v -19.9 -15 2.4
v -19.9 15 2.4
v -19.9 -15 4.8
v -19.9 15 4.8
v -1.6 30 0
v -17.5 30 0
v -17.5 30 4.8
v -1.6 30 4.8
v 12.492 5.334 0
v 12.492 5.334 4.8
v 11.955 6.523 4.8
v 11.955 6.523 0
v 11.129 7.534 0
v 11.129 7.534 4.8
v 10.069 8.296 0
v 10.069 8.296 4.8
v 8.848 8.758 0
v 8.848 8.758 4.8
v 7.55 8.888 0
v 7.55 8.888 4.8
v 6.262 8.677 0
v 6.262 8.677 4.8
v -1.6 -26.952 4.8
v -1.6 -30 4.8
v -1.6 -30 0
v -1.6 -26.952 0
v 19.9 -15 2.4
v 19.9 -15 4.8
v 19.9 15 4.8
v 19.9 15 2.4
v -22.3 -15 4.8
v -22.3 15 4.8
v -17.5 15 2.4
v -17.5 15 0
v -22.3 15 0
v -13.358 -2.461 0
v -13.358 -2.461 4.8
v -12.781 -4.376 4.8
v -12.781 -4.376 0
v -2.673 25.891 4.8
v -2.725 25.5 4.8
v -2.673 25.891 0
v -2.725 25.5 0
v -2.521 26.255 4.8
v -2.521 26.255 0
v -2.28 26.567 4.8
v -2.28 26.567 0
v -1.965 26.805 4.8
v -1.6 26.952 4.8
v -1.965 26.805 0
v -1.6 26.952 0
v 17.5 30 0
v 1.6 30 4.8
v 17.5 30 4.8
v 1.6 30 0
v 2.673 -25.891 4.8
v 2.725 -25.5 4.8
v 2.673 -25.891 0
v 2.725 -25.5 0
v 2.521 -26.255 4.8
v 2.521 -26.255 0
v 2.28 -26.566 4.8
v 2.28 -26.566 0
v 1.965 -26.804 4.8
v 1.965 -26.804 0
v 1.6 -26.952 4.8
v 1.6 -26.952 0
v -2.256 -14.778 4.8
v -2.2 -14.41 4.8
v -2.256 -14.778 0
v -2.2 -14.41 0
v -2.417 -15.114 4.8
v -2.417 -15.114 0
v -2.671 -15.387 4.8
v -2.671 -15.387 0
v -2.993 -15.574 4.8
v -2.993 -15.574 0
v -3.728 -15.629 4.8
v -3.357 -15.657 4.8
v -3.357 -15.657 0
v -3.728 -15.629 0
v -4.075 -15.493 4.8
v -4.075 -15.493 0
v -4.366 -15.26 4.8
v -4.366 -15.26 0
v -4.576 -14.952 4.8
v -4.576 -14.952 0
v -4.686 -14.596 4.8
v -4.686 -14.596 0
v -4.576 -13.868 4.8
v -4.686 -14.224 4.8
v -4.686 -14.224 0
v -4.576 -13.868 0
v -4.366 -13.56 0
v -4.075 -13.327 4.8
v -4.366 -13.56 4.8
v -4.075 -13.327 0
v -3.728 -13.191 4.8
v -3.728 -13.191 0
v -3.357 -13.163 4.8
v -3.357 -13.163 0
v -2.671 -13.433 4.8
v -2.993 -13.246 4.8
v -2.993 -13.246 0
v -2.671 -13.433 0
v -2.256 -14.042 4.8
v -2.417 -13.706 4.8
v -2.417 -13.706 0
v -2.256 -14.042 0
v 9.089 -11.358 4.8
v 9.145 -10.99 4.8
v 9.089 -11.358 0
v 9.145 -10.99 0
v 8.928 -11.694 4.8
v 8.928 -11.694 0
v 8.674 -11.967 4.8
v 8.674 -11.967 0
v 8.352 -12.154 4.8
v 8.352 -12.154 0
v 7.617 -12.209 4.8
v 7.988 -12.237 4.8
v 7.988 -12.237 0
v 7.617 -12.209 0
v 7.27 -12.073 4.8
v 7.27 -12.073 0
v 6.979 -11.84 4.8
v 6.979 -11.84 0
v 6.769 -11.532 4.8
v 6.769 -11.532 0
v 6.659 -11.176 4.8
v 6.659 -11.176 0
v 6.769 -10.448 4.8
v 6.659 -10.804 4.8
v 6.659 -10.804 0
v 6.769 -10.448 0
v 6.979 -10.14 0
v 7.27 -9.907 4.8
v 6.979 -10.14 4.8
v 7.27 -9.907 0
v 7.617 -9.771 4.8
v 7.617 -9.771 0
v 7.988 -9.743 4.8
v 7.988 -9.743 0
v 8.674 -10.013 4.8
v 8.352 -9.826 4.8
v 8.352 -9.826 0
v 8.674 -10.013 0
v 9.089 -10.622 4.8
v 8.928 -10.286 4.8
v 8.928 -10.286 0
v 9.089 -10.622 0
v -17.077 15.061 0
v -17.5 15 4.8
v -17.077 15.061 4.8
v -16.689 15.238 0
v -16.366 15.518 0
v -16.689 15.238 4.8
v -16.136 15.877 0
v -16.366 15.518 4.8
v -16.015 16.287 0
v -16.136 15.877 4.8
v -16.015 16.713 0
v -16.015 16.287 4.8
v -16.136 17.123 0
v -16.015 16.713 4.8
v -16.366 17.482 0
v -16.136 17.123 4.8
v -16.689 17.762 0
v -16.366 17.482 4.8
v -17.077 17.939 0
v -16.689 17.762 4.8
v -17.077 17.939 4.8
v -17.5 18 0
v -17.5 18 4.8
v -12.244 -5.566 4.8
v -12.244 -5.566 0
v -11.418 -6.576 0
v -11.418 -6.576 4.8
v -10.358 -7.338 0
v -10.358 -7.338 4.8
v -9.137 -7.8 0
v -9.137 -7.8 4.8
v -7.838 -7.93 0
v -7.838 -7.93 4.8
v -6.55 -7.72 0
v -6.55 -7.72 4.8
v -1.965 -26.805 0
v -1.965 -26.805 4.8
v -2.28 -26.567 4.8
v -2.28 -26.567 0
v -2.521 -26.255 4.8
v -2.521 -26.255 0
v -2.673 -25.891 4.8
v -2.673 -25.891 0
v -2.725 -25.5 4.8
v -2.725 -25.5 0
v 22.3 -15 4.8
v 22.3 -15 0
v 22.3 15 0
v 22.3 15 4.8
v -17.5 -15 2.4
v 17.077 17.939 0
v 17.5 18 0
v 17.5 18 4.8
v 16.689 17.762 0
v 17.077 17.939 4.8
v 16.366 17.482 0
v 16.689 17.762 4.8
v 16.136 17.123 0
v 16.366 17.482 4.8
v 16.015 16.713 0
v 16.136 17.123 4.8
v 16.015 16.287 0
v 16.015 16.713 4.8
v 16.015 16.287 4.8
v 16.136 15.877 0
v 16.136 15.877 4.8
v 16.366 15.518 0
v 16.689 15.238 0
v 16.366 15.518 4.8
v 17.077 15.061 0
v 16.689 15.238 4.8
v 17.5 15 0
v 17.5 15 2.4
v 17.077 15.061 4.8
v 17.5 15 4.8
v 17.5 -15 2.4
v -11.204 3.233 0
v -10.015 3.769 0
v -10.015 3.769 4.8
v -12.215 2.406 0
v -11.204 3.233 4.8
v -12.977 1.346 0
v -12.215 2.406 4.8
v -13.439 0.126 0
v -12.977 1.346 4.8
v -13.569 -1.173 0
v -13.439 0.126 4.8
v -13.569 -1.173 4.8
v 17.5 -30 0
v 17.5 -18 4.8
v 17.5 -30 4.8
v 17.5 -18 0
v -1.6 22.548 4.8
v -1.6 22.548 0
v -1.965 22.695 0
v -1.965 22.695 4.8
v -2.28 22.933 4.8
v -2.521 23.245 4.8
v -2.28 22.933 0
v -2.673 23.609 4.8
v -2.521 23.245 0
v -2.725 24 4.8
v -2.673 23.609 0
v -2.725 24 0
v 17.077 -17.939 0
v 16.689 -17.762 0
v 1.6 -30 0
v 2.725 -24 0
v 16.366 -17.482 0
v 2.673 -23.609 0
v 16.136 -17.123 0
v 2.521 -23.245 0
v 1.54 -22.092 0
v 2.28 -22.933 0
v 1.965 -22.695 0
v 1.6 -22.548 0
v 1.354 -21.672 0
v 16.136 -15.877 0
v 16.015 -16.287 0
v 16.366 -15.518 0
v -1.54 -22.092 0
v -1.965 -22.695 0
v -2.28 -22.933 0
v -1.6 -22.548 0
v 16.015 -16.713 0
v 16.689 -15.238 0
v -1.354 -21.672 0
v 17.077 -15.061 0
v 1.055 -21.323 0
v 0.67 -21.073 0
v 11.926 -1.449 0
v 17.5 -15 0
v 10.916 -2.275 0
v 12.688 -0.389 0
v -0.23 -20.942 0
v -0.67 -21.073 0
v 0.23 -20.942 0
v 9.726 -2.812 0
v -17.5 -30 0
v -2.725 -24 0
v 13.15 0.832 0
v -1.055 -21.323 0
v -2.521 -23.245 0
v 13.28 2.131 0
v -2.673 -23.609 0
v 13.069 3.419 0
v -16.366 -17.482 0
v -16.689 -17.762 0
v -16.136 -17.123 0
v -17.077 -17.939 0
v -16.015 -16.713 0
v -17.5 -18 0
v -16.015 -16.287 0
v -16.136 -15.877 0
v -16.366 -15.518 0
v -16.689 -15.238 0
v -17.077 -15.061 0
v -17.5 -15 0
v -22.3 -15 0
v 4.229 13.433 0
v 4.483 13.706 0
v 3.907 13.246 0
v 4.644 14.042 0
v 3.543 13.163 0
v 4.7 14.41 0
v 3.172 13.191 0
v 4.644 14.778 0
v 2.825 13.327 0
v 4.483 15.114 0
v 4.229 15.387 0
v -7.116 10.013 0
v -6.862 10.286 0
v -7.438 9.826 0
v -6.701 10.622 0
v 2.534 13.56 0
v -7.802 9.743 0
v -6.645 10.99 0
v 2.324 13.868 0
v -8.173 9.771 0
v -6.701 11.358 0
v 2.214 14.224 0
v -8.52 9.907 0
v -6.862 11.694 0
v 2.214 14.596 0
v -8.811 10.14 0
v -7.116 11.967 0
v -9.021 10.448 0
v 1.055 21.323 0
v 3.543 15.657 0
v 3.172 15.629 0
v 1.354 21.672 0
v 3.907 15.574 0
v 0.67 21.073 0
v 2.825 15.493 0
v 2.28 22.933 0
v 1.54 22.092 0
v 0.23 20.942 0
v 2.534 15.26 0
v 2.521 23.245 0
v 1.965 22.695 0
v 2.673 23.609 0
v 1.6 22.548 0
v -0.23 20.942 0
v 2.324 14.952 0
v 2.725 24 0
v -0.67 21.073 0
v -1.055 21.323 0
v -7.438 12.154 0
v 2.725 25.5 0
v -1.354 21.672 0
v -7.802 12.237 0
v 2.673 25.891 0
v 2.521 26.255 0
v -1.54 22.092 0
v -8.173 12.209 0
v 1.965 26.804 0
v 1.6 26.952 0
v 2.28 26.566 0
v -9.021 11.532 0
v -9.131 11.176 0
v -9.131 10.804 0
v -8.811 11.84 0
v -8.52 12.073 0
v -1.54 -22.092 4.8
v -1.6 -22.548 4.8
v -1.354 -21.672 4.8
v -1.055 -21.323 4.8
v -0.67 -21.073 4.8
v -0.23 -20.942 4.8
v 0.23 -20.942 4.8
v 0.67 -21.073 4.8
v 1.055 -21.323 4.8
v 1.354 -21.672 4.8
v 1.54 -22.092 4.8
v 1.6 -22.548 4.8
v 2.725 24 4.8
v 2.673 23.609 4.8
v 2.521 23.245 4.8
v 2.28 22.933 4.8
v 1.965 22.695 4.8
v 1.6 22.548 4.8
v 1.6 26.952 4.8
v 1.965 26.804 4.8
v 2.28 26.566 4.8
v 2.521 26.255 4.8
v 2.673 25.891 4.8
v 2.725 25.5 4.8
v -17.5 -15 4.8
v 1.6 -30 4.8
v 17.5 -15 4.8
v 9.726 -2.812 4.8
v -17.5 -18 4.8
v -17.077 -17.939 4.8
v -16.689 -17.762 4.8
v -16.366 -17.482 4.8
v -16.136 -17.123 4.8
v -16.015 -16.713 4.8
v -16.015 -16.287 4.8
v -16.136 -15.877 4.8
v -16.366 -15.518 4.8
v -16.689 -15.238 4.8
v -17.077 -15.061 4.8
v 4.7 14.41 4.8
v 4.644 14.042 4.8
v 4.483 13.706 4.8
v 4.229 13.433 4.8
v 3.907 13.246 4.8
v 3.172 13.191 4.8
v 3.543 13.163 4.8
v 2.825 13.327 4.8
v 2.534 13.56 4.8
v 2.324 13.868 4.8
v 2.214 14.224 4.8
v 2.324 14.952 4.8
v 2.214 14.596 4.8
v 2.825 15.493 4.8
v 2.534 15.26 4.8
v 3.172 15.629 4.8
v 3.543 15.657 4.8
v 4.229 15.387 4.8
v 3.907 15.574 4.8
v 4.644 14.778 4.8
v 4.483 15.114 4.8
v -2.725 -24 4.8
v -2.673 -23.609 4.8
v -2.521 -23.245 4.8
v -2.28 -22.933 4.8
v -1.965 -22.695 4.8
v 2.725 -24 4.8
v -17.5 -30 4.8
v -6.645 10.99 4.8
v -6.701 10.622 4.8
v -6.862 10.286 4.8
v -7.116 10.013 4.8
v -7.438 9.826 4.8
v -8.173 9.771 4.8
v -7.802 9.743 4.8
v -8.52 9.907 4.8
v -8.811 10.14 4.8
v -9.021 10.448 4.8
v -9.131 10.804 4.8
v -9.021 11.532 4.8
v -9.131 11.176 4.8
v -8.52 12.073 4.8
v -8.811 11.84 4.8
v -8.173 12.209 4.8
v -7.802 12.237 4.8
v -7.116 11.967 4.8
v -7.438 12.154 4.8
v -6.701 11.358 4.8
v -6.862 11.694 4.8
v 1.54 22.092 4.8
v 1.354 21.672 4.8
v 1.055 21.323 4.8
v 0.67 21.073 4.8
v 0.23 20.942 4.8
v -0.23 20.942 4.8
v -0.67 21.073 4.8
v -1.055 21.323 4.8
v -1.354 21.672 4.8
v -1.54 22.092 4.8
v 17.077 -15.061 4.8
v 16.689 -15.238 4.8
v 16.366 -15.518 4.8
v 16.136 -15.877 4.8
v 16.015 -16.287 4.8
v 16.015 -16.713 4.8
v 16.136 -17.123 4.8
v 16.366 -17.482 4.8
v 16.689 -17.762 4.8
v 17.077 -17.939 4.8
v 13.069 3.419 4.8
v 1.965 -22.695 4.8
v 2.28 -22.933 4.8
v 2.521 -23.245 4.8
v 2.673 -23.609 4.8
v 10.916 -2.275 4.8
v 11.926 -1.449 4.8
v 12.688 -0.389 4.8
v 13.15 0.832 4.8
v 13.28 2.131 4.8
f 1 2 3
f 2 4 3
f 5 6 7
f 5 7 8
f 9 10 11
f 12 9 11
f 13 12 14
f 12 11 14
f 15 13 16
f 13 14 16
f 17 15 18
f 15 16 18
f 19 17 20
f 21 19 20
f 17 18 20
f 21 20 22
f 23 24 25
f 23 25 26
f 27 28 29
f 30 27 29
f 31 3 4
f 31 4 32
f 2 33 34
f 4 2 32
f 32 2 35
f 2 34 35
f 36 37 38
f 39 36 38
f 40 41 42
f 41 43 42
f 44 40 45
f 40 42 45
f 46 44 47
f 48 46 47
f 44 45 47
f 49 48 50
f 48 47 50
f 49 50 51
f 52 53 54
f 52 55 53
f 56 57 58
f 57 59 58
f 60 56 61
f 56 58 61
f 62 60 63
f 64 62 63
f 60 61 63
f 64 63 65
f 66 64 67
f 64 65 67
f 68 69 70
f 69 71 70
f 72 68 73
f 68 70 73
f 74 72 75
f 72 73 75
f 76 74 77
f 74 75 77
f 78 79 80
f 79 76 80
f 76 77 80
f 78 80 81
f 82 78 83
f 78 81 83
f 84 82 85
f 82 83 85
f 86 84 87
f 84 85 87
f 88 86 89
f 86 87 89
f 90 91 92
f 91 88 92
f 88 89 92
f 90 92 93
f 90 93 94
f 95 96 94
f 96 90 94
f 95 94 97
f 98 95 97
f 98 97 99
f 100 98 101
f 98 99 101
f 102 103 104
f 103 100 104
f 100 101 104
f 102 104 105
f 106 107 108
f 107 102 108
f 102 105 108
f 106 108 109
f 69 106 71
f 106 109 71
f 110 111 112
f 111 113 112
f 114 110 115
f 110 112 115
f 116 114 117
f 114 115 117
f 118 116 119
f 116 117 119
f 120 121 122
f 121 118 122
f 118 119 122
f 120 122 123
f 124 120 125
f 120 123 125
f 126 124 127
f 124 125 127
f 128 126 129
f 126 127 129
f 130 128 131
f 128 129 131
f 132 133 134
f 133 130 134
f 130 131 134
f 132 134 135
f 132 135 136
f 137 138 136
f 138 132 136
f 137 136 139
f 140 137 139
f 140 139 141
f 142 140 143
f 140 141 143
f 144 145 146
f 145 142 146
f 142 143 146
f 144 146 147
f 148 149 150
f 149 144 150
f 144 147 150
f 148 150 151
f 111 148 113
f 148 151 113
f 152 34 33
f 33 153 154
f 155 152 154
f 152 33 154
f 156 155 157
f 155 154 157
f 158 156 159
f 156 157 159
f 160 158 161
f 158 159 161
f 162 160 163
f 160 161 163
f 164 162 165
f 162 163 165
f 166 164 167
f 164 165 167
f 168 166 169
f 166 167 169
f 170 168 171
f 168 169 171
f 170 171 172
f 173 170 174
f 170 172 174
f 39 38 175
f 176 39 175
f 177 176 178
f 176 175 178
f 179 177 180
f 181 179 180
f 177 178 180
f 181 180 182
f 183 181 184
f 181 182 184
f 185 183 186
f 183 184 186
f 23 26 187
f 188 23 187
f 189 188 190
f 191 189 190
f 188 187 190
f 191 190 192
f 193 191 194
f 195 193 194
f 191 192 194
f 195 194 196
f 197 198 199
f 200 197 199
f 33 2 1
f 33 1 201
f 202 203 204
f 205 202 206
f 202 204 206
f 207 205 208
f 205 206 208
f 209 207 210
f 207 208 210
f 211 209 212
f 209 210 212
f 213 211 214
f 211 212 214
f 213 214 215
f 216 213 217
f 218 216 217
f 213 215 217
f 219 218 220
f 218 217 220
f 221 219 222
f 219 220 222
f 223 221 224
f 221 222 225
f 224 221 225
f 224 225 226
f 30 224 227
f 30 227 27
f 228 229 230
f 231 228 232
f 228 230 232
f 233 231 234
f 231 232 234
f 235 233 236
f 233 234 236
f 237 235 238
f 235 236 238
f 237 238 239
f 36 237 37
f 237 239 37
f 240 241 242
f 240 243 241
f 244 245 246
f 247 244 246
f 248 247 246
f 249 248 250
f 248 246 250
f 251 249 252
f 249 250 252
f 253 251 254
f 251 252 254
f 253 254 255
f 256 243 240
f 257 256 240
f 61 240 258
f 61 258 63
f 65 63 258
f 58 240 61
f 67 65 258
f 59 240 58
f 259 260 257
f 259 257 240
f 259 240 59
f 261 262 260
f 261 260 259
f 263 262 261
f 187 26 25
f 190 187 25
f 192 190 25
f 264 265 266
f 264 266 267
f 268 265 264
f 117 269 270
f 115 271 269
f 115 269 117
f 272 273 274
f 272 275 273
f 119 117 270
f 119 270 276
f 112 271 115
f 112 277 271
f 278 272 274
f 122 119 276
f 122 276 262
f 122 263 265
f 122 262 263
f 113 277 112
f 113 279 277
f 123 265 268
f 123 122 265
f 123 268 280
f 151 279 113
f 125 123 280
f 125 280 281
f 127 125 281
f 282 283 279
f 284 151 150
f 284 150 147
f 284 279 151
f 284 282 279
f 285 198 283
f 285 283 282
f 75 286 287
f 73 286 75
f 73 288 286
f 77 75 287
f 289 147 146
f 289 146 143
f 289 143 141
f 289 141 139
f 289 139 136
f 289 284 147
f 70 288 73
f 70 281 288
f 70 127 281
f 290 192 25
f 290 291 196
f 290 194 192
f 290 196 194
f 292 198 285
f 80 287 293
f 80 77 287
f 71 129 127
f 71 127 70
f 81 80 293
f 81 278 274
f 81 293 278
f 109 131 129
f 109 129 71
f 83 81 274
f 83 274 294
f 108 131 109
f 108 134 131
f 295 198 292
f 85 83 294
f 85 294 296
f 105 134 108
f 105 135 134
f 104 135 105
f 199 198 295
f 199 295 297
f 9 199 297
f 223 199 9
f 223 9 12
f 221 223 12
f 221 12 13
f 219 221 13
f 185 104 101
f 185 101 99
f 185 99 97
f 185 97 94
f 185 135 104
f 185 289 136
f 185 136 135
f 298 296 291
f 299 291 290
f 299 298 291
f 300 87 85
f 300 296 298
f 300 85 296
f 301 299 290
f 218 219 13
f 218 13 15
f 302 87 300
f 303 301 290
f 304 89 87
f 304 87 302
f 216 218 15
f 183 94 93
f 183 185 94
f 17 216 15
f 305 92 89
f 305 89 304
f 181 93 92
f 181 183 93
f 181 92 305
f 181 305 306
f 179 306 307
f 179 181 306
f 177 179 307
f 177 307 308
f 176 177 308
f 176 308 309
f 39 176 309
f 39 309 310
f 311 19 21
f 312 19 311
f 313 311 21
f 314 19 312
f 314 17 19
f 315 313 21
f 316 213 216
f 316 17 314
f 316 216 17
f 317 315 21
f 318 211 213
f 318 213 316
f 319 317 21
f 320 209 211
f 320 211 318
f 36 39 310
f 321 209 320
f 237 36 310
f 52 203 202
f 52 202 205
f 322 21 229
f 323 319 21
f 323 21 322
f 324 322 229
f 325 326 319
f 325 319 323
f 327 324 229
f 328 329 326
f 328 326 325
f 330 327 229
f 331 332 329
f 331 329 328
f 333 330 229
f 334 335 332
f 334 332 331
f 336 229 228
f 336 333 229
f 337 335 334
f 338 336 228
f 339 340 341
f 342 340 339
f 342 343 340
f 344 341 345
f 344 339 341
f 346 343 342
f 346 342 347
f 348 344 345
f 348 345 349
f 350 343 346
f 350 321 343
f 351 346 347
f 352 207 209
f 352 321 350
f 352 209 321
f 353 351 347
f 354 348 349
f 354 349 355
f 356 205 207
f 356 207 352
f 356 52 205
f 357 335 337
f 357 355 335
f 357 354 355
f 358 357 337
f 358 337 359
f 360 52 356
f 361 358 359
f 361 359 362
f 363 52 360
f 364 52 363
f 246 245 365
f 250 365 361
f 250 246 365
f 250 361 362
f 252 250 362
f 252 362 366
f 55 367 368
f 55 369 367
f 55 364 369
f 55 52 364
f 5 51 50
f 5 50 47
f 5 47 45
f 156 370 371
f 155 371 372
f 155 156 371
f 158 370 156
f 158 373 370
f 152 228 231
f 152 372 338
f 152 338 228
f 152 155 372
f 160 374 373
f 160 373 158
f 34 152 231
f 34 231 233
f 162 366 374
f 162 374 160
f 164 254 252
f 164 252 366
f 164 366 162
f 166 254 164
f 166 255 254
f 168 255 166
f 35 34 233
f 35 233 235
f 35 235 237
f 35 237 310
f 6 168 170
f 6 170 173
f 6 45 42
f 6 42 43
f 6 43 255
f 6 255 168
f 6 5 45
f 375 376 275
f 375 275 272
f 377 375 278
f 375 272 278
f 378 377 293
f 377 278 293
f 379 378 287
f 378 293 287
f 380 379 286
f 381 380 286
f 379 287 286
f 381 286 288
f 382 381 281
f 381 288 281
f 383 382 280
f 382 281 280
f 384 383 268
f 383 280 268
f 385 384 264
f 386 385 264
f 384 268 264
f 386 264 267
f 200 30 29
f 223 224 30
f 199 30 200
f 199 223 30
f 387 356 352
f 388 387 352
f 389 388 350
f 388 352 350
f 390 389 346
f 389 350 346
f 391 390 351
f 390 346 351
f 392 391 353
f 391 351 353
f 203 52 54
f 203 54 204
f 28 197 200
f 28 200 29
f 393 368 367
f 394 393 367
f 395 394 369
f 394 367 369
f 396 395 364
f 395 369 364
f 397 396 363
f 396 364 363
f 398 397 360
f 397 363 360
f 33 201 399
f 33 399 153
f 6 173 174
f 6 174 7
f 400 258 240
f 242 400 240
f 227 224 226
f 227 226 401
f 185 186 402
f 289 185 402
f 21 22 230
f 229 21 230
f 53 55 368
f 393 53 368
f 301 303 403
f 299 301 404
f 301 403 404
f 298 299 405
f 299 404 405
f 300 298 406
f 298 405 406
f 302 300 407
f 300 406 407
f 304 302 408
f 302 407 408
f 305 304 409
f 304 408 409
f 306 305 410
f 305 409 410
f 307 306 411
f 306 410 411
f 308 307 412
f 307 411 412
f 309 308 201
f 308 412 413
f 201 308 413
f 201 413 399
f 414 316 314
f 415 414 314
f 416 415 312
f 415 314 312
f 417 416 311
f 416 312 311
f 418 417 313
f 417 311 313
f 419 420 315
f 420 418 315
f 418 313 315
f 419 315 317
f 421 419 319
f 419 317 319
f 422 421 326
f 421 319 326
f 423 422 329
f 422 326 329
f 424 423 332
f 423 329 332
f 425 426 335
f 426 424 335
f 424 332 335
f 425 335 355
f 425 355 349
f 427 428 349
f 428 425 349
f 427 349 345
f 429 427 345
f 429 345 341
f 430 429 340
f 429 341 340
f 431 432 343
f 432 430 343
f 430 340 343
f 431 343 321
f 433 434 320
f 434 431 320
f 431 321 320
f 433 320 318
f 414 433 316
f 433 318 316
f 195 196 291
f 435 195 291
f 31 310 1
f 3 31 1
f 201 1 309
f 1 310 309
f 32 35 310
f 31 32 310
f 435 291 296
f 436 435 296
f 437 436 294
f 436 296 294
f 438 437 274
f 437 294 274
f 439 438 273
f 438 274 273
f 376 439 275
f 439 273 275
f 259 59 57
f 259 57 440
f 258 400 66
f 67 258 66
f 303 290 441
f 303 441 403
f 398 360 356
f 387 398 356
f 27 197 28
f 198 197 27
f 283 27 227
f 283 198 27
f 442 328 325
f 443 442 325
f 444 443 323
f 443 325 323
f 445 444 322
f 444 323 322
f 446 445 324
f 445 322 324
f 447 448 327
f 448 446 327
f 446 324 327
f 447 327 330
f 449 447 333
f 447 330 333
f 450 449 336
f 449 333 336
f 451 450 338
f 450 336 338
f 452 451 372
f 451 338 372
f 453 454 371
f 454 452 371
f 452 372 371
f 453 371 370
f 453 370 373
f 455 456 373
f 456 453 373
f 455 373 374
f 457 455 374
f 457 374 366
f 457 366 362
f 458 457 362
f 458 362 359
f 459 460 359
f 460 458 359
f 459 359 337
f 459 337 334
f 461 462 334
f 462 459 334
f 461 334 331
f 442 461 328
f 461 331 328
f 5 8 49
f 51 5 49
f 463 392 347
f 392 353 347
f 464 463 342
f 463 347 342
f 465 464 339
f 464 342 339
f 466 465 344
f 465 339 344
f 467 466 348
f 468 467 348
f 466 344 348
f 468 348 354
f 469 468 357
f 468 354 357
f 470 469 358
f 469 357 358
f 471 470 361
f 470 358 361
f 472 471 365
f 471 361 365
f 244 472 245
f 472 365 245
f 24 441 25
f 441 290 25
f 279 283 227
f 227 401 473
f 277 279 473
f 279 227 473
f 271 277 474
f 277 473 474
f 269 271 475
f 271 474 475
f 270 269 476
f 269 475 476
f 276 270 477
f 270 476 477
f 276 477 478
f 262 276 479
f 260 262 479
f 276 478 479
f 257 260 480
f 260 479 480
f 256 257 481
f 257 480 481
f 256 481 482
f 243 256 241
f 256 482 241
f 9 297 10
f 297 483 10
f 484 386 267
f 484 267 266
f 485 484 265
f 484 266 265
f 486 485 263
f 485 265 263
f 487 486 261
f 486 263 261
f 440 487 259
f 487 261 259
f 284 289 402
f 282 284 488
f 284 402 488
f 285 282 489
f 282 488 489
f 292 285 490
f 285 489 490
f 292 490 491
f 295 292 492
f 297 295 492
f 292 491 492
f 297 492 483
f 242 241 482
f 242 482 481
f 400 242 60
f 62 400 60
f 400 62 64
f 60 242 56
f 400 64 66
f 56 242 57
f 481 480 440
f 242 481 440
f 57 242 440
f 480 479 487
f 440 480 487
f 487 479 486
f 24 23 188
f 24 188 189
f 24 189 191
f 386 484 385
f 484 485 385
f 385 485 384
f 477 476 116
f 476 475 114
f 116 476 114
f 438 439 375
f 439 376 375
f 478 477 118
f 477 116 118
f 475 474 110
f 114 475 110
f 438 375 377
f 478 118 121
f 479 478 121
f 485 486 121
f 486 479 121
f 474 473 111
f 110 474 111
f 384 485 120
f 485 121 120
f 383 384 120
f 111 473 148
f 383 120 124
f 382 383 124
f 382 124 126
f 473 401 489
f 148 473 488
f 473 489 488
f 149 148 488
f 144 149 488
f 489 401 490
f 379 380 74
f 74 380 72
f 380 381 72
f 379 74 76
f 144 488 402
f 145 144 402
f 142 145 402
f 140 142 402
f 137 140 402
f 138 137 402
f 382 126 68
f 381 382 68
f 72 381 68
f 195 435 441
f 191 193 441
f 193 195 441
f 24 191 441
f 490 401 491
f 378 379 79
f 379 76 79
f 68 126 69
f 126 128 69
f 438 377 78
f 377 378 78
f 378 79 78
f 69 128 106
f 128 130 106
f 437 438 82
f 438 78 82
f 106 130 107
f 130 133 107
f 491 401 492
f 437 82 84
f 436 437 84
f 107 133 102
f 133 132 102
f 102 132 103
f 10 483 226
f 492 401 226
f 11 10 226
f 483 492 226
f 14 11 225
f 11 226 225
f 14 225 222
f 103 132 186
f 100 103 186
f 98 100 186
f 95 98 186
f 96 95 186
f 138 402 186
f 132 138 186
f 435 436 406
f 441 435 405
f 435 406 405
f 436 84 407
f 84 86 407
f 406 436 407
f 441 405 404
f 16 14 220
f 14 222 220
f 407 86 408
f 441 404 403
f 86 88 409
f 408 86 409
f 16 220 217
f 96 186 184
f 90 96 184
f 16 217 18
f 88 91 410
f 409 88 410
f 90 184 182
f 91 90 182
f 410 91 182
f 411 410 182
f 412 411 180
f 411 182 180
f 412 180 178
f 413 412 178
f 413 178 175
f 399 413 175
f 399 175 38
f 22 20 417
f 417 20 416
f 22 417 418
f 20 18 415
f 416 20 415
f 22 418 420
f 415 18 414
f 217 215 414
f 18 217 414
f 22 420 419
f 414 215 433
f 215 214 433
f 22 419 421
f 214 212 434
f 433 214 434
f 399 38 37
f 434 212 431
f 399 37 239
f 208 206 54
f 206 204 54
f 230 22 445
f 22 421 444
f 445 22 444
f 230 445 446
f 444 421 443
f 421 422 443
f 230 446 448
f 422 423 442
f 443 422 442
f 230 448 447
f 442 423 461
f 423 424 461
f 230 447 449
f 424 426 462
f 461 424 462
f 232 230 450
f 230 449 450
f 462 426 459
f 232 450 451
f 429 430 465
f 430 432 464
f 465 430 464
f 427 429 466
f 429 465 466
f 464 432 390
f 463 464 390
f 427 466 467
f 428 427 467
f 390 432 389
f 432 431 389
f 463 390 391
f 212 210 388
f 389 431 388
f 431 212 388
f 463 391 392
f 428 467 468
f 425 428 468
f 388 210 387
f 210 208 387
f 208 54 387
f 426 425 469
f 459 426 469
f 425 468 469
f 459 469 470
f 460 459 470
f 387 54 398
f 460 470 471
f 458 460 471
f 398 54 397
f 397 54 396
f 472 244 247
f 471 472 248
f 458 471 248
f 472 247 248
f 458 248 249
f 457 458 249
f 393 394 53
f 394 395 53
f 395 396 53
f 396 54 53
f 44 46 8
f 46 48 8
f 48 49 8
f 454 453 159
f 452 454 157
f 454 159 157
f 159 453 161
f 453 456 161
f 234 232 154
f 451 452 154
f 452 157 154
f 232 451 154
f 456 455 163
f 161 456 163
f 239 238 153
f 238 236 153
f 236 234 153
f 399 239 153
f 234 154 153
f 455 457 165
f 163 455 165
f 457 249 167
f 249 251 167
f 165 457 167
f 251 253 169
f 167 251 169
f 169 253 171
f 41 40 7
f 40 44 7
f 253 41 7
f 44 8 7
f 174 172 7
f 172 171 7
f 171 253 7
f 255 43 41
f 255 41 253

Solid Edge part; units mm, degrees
sketch "Sketch1" plane through (0, 0, 0) normal (0, 0, 1) x (1, 0, 0)
  line L0 (-17.5, 30) -> (17.5, 30)
  line L1 (17.5, 30) -> (17.5, 15)
  line L2 (17.5, 15) -> (22.3, 15)
  line L3 (22.3, 0) -> (22.3, 15)
  line L4 (22.3, 0) -> (22.3, -15)
  line L5 (22.3, -15) -> (17.5, -15)
  line L6 (17.5, -30) -> (17.5, -15)
  line L7 (-17.5, -30) -> (17.5, -30)
  line L8 (-17.5, -15) -> (-17.5, -30)
  line L9 (-22.3, -15) -> (-17.5, -15)
  line L10 (-22.3, 0) -> (-22.3, -15)
  line L11 (-22.3, 0) -> (-22.3, 15)
  line L12 (-17.5, 15) -> (-22.3, 15)
  line L13 (-17.5, 15) -> (-17.5, 30)
  circle A0 centre (3.45, 14.41) radius 1.25
  circle A1 centre (-7.895, 10.99) radius 1.25
  circle A2 centre (-3.45, -14.41) radius 1.25
  circle A3 centre (7.895, -10.99) radius 1.25
  dimension "D1" = 30
  dimension "D2" = 15
  dimension "D3" = 35
  dimension "D4" = 15
extrude "ExtrudedProtrusion_6" add sketch "Sketch1" along normal blind 4.8
sketch "Sketch2" plane through (0, 0, 4.8) normal (0, 0, 1) x (1, 0, 0)
  line L0 (-19.9, 15) -> (-19.9, -15.25)
  line L1 (-19.9, -15.25) -> (-17.5, -15.25)
  line L2 (-17.5, -15.25) -> (-17.5, 15)
  line L3 (-17.5, 15) -> (-19.9, 15)
  line L4 (19.9, -15) -> (19.9, 15)
  line L5 (19.9, 15) -> (17.5, 15)
  line L6 (17.5, 15) -> (17.5, -15)
  line L7 (17.5, -15) -> (19.9, -15)
extrude "ExtrudedCutout_5" cut sketch "Sketch2" against normal blind 2.4
sketch "Sketch3" plane through (0, -0.25, 4.8) normal (0, 0, 1) x (1, 0, 0)
  line L0 (6.2615, 8.9272) -> (-10.0146, 4.0193)
  arc A0 (-13.3582, -2.2113) -> (-10.0146, 4.0193) centre (-8.5711, -0.7678) cw
  line L1 (-13.3582, -2.2113) -> (-12.7808, -4.1261)
  arc A1 (-12.7808, -4.1261) -> (-6.5502, -7.4697) centre (-7.9937, -2.6826) ccw
  line L2 (-6.5502, -7.4697) -> (9.7259, -2.5619)
  arc A2 (9.7259, -2.5619) -> (13.0695, 3.6687) centre (8.2824, 2.2252) ccw
  line L3 (13.0695, 3.6687) -> (12.4921, 5.5835)
  arc A3 (6.2615, 8.9272) -> (12.4921, 5.5835) centre (7.705, 4.1401) cw
extrude "ExtrudedCutout_7" cut sketch "Sketch3" against normal blind 5
sketch "Sketch4" plane through (0, -0.25, 4.8) normal (0, 0, 1) x (1, 0, 0)
  arc A0 (-17.5, 18.25) -> (-17.5, 15.25) centre (-17.5, 16.75) cw
  line L0 (-17.5, 15.25) -> (-17.5, 18.25)
  arc A1 (-17.5, -14.75) -> (-17.5, -17.75) centre (-17.5, -16.25) cw
  line L1 (-17.5, -14.75) -> (-17.5, -17.75)
  arc A2 (17.5, -17.75) -> (17.5, -14.75) centre (17.5, -16.25) cw
  line L2 (17.5, -14.75) -> (17.5, -17.75)
  line L3 (17.5, 15.25) -> (17.5, 18.25)
  arc A3 (17.5, 15.25) -> (17.5, 18.25) centre (17.5, 16.75) cw
extrude "Cutout1" cut sketch "Sketch4" against normal blind 5
sketch "Sketch5" plane through (0, -0.25, 0) normal (0, 0, -1) x (-1, 0, 0)
  line L0 (-1.6, 30.25) -> (-1.6, 27.2024)
  arc A0 (-1.6, 27.2024) -> (-2.725, 25.75) centre (-1.225, 25.75) ccw
  line L1 (-2.725, 25.75) -> (-2.725, 24.25)
  arc A1 (-2.725, 24.25) -> (-1.5998, 22.7976) centre (-1.225, 24.25) ccw
  arc A2 (-1.5998, 22.7976) -> (1.5998, 22.7976) centre (0, 22.7754) ccw
  arc A3 (2.725, 24.25) -> (1.5998, 22.7976) centre (1.225, 24.25) cw
  line L2 (2.725, 25.75) -> (2.725, 24.25)
  arc A4 (1.5998, 27.2024) -> (2.725, 25.75) centre (1.225, 25.75) cw
  line L3 (1.5998, 30.25) -> (1.5998, 27.2024)
  line L4 (0, 30.25) -> (1.5998, 30.25)
  line L5 (0, 30.25) -> (-1.6, 30.25)
  arc A5 (-1.5998, -22.2976) -> (1.5998, -22.2976) centre (0, -22.2754) cw
  arc A6 (2.725, -23.75) -> (1.5998, -22.2976) centre (1.225, -23.75) ccw
  line L6 (2.725, -25.25) -> (2.725, -23.75)
  arc A7 (1.5998, -26.7024) -> (2.725, -25.25) centre (1.225, -25.25) ccw
  line L7 (1.5998, -29.75) -> (1.5998, -26.7024)
  line L8 (0, -29.75) -> (1.5998, -29.75)
  line L9 (0, -29.75) -> (-1.6, -29.75)
  line L10 (-1.6, -29.75) -> (-1.6, -26.7024)
  arc A8 (-1.6, -26.7024) -> (-2.725, -25.25) centre (-1.225, -25.25) cw
  line L11 (-2.725, -25.25) -> (-2.725, -23.75)
  arc A9 (-2.725, -23.75) -> (-1.5998, -22.2976) centre (-1.225, -23.75) cw
extrude "Cutout2" cut sketch "Sketch5" against normal up to next
properties material "Polycarbonate"
